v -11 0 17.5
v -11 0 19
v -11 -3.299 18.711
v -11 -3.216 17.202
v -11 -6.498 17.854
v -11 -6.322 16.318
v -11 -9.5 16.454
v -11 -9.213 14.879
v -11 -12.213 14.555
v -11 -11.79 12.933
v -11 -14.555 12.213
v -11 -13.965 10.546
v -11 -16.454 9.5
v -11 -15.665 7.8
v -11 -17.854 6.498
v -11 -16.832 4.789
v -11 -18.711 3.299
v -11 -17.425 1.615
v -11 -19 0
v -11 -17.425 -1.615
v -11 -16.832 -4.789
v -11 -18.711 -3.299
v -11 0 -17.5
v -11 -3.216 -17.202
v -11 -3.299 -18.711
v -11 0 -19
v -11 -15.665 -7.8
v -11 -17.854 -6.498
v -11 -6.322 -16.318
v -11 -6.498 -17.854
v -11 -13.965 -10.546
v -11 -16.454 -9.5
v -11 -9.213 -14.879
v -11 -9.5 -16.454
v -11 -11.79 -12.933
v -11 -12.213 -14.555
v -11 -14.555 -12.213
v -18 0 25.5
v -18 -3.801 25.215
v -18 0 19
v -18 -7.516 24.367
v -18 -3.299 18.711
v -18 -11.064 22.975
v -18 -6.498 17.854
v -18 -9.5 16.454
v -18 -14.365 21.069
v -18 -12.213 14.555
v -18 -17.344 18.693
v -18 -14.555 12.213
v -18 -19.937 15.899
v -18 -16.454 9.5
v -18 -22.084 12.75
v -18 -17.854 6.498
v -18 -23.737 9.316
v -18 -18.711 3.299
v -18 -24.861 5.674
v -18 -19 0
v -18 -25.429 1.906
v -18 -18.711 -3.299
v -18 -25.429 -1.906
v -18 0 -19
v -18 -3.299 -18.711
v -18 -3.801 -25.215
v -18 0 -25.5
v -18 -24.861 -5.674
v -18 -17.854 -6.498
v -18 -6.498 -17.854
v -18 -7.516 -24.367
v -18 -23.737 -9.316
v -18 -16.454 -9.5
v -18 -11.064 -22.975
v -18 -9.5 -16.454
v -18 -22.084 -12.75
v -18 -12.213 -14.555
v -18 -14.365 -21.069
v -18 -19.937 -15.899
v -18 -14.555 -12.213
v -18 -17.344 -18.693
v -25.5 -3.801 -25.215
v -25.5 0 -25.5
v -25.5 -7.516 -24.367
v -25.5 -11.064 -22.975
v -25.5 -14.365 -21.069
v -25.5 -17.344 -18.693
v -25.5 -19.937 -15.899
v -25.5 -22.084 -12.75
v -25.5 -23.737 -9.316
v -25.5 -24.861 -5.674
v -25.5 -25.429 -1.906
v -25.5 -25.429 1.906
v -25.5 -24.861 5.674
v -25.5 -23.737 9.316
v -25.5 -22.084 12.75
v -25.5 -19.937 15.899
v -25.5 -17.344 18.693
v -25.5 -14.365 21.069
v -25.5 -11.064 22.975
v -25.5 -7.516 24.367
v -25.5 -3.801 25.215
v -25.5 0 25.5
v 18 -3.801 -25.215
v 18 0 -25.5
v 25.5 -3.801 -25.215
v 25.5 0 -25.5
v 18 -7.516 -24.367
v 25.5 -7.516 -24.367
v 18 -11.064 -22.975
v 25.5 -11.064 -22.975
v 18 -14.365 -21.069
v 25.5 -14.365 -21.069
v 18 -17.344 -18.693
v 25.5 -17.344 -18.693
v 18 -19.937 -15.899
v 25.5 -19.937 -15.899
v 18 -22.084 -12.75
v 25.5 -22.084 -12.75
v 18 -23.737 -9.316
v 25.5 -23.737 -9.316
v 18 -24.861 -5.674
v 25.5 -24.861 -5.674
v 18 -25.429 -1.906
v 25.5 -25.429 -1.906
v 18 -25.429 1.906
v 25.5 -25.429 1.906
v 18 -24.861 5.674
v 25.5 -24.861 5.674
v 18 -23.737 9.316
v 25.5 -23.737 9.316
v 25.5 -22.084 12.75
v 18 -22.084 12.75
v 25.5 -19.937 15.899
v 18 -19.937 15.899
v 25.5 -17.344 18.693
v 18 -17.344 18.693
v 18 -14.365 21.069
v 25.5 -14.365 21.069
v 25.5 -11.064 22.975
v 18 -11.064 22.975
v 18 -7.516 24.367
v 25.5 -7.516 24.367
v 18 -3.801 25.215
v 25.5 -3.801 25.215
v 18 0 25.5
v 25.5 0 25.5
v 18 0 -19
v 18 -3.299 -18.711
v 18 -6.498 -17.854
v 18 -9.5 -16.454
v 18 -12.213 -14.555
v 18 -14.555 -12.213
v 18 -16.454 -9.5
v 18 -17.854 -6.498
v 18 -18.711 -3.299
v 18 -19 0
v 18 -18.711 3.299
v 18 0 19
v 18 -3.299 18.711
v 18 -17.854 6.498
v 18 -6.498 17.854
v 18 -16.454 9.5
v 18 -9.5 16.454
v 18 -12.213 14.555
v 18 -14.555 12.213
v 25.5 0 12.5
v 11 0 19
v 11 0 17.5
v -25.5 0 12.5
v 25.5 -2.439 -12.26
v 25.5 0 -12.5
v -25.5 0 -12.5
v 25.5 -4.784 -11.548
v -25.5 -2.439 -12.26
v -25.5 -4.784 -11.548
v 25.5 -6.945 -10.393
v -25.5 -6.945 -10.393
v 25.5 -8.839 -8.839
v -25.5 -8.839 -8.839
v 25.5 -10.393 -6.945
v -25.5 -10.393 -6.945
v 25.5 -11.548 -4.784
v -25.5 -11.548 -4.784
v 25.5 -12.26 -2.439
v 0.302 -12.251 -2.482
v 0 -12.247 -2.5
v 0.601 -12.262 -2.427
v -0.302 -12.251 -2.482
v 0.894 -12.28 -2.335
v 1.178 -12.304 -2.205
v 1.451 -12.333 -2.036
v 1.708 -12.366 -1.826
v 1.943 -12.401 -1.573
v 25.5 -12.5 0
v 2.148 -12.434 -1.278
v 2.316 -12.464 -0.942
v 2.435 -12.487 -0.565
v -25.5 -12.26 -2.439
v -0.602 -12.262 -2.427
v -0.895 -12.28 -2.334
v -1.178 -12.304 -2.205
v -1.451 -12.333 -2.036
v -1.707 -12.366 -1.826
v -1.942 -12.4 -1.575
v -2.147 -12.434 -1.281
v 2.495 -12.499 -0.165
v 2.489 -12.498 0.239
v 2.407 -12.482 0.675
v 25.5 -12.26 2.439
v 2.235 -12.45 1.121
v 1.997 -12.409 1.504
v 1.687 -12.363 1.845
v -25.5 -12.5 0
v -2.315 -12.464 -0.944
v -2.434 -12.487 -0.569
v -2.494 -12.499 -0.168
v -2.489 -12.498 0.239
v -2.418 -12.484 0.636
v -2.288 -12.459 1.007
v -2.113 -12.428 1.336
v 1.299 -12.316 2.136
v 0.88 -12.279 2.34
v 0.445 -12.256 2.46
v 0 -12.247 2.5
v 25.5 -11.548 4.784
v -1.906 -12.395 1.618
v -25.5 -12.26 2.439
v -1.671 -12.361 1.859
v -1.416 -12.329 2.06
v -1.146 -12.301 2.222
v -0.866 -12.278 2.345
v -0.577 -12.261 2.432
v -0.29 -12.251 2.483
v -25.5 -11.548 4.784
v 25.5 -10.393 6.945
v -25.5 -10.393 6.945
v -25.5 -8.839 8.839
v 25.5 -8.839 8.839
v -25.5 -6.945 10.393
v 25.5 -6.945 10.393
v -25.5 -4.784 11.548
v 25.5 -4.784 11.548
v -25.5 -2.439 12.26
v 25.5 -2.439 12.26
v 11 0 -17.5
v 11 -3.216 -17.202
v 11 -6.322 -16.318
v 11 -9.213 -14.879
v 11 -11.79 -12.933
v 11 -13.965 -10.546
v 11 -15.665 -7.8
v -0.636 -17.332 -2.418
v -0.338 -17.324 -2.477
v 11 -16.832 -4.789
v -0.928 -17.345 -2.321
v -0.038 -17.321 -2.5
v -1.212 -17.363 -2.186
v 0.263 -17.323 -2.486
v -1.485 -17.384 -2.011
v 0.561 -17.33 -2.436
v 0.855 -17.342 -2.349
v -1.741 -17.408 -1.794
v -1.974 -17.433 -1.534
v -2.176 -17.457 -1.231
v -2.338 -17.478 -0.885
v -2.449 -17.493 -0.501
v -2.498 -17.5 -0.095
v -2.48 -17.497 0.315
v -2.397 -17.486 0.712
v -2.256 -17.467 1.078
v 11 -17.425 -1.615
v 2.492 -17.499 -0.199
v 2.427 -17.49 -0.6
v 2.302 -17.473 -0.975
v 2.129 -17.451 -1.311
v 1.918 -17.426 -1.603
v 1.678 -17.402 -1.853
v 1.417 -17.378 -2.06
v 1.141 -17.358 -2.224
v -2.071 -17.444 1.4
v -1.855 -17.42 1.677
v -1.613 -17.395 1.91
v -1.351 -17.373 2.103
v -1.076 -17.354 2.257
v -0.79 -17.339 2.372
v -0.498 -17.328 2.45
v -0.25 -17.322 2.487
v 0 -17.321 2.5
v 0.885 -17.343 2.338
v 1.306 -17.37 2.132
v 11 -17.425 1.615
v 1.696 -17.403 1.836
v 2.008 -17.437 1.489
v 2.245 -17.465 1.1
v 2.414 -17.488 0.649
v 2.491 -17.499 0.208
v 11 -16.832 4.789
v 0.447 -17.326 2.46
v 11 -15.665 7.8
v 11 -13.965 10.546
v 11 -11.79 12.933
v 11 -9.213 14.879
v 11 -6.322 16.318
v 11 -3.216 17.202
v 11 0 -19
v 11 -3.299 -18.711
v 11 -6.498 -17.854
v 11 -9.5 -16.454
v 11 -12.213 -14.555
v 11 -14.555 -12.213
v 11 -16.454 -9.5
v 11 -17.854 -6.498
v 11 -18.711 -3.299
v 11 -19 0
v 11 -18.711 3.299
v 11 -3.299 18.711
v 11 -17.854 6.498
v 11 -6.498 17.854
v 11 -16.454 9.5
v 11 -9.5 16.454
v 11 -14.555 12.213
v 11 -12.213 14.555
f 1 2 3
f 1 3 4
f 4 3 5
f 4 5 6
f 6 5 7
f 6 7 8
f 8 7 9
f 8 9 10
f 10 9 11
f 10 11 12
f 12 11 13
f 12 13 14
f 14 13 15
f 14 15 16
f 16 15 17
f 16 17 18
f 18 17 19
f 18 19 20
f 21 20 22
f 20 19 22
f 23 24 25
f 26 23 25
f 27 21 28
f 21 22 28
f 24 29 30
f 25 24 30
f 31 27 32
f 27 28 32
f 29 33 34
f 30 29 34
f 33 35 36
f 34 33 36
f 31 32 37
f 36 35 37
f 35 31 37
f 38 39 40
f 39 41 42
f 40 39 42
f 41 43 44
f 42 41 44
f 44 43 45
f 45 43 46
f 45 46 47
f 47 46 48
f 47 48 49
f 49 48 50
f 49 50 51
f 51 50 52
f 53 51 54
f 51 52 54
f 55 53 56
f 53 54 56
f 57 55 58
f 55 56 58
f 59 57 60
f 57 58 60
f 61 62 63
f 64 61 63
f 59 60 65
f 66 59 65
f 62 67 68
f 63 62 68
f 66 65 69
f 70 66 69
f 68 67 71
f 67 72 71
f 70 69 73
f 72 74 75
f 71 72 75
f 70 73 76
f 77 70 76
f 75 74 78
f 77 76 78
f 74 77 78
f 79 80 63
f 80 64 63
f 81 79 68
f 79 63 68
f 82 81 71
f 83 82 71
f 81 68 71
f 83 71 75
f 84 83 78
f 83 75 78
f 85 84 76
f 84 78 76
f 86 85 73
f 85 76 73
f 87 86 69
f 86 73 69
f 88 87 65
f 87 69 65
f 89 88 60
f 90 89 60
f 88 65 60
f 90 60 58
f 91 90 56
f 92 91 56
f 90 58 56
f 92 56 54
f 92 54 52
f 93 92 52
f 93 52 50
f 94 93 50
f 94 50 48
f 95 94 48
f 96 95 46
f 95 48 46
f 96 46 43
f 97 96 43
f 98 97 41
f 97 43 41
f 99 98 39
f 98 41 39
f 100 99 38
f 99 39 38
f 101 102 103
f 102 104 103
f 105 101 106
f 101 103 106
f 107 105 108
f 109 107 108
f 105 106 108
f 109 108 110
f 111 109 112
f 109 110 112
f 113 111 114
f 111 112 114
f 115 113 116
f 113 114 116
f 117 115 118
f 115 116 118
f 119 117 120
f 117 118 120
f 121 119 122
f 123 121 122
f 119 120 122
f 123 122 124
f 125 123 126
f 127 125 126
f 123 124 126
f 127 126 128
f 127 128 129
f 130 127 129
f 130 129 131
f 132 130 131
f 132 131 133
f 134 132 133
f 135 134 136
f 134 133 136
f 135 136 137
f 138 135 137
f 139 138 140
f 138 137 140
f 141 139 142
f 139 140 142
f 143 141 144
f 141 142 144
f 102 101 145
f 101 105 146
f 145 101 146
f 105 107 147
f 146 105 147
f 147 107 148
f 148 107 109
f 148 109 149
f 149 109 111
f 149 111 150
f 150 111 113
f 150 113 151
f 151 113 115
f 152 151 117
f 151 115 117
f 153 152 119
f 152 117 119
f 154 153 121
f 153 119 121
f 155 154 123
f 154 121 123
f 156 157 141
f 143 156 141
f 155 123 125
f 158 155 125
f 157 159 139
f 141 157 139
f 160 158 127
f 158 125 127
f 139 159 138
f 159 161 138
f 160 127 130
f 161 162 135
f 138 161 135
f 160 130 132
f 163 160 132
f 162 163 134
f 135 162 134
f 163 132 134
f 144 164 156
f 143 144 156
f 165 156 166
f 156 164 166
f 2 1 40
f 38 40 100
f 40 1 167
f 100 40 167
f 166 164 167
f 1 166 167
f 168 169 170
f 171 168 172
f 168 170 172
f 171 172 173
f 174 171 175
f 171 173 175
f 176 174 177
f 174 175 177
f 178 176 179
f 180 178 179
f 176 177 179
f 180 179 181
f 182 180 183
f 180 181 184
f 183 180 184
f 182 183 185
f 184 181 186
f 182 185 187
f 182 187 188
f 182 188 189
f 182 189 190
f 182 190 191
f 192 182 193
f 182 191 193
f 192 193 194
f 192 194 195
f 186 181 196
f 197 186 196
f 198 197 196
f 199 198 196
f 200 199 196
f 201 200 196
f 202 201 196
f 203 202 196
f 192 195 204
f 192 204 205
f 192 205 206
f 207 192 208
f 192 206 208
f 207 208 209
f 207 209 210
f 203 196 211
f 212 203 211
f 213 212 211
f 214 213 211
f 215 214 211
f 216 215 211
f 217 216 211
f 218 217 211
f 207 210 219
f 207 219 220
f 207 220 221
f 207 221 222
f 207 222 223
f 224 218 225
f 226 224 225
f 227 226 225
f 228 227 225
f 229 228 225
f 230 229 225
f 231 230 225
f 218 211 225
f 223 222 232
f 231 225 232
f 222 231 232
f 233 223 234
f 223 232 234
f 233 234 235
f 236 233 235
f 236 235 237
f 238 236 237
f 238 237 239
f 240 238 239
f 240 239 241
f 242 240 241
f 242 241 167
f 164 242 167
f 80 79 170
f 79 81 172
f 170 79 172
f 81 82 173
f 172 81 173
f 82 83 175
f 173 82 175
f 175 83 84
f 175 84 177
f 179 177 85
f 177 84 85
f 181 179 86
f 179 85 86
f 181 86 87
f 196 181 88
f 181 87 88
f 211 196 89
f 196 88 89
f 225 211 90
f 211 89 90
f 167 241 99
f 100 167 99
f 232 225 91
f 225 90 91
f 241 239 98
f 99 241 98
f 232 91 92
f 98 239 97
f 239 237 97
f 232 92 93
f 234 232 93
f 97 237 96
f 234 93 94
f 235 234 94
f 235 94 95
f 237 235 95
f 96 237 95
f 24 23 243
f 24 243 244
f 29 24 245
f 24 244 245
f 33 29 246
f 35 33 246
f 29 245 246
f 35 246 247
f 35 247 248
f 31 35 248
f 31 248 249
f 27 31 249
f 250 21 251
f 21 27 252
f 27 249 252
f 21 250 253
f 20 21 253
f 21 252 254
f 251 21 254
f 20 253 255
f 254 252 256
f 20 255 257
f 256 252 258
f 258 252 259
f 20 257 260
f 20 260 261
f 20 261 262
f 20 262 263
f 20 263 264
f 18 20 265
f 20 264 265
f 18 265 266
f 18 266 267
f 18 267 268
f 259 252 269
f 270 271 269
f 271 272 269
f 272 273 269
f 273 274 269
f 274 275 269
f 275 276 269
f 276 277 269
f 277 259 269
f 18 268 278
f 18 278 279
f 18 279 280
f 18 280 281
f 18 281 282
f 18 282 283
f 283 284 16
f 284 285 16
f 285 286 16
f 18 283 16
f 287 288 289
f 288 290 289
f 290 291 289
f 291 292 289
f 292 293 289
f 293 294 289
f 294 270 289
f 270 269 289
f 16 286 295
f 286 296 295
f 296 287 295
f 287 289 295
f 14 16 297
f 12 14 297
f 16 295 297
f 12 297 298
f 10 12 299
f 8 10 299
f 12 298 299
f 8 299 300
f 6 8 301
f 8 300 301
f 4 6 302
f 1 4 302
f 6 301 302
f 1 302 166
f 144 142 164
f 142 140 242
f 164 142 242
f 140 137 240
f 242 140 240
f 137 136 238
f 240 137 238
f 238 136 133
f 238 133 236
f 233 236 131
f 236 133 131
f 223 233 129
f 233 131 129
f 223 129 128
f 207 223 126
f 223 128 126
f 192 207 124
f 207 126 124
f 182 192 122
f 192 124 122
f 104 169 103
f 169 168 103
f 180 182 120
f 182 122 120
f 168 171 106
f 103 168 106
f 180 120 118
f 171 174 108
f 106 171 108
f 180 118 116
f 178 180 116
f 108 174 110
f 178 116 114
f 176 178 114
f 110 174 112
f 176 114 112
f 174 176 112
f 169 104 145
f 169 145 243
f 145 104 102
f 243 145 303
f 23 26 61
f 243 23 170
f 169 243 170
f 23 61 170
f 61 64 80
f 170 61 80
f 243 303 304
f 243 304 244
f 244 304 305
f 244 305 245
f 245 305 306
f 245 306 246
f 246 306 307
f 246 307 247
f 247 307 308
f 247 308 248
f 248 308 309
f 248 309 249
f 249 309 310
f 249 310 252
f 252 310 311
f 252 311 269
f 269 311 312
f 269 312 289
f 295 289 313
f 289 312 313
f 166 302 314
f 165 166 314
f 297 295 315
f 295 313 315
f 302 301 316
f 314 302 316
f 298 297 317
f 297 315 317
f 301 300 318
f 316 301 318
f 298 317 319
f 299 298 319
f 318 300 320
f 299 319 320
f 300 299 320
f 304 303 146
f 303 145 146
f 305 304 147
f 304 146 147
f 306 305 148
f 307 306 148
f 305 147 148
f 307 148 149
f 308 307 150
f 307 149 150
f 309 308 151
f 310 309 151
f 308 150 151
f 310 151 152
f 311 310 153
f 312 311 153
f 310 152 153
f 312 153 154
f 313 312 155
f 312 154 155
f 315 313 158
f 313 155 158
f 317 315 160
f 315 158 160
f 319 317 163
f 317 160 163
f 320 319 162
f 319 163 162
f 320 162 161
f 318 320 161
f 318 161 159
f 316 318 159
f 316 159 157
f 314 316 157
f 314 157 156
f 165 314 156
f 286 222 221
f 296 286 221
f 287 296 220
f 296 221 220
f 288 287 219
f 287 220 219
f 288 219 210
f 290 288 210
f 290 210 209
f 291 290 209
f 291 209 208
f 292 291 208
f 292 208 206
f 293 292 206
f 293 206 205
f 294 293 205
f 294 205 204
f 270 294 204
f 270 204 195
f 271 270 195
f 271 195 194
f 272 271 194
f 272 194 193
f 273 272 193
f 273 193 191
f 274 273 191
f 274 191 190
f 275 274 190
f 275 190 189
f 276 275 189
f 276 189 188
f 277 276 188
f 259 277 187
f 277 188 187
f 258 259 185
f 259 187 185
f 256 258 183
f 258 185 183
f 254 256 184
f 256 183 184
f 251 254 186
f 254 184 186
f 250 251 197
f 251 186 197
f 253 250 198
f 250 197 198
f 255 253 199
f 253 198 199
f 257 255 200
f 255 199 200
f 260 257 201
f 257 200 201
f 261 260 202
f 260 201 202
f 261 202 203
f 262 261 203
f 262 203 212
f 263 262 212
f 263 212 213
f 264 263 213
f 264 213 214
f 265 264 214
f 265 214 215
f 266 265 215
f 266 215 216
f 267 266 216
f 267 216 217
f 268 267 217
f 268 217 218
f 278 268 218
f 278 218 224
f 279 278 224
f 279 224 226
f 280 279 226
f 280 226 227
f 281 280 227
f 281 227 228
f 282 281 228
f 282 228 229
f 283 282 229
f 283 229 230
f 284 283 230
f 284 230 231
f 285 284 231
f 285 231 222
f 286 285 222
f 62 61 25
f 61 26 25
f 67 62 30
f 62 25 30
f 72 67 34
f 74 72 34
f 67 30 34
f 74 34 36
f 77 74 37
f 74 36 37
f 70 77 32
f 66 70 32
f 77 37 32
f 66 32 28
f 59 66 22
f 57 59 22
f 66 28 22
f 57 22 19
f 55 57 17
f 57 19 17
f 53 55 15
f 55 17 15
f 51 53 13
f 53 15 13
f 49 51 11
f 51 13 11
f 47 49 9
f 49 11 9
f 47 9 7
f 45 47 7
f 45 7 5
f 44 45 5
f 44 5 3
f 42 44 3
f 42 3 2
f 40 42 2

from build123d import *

# Parameters (mm, degrees)
REVOLVE3_ANGLE           = 180
CUT_EXTRUDE1_DEPTH       = 52
F_6_0_6_DIAMETER_HOLE1_D = 5


with BuildPart() as part:
    # Sketch2 → Revolve3 (revolve)
    with BuildSketch(Plane(origin=(0, 0, 0), x_dir=(1, 0, 0), z_dir=(0, 1, 0))):
        Polygon((25.5, 0), (-25.5, 0), (-25.5, 25.5), (-18, 25.5), (-18, 19), (-11, 19), (-11, 17.5), (11, 17.5), (11, 19), (18, 19), (18, 25.5), (25.5, 25.5), align=None)
    revolve(axis=Axis((25.5, 0, 0), (-1, 0, 0)), revolution_arc=REVOLVE3_ANGLE)

    # Sketch3 → Cut-Extrude1 (cut, through all)
    with BuildSketch(Plane.ZY.offset(25.5)):
        with BuildLine():
            Line((12.5, 0), (-12.5, 0))
            ThreePointArc((-12.5, 0), (0, -12.5), (12.5, 0))
        make_face()
    extrude(amount=-CUT_EXTRUDE1_DEPTH, mode=Mode.SUBTRACT)

    # Ø6.0 (6) Diameter Hole1 (through all)
    with Locations(Plane(origin=(0, -17.5, 0), x_dir=(0, 0, -1), z_dir=(0, -1, 0))):
        with Locations((0, 0)):
            Hole(F_6_0_6_DIAMETER_HOLE1_D / 2)


solid = part.part
